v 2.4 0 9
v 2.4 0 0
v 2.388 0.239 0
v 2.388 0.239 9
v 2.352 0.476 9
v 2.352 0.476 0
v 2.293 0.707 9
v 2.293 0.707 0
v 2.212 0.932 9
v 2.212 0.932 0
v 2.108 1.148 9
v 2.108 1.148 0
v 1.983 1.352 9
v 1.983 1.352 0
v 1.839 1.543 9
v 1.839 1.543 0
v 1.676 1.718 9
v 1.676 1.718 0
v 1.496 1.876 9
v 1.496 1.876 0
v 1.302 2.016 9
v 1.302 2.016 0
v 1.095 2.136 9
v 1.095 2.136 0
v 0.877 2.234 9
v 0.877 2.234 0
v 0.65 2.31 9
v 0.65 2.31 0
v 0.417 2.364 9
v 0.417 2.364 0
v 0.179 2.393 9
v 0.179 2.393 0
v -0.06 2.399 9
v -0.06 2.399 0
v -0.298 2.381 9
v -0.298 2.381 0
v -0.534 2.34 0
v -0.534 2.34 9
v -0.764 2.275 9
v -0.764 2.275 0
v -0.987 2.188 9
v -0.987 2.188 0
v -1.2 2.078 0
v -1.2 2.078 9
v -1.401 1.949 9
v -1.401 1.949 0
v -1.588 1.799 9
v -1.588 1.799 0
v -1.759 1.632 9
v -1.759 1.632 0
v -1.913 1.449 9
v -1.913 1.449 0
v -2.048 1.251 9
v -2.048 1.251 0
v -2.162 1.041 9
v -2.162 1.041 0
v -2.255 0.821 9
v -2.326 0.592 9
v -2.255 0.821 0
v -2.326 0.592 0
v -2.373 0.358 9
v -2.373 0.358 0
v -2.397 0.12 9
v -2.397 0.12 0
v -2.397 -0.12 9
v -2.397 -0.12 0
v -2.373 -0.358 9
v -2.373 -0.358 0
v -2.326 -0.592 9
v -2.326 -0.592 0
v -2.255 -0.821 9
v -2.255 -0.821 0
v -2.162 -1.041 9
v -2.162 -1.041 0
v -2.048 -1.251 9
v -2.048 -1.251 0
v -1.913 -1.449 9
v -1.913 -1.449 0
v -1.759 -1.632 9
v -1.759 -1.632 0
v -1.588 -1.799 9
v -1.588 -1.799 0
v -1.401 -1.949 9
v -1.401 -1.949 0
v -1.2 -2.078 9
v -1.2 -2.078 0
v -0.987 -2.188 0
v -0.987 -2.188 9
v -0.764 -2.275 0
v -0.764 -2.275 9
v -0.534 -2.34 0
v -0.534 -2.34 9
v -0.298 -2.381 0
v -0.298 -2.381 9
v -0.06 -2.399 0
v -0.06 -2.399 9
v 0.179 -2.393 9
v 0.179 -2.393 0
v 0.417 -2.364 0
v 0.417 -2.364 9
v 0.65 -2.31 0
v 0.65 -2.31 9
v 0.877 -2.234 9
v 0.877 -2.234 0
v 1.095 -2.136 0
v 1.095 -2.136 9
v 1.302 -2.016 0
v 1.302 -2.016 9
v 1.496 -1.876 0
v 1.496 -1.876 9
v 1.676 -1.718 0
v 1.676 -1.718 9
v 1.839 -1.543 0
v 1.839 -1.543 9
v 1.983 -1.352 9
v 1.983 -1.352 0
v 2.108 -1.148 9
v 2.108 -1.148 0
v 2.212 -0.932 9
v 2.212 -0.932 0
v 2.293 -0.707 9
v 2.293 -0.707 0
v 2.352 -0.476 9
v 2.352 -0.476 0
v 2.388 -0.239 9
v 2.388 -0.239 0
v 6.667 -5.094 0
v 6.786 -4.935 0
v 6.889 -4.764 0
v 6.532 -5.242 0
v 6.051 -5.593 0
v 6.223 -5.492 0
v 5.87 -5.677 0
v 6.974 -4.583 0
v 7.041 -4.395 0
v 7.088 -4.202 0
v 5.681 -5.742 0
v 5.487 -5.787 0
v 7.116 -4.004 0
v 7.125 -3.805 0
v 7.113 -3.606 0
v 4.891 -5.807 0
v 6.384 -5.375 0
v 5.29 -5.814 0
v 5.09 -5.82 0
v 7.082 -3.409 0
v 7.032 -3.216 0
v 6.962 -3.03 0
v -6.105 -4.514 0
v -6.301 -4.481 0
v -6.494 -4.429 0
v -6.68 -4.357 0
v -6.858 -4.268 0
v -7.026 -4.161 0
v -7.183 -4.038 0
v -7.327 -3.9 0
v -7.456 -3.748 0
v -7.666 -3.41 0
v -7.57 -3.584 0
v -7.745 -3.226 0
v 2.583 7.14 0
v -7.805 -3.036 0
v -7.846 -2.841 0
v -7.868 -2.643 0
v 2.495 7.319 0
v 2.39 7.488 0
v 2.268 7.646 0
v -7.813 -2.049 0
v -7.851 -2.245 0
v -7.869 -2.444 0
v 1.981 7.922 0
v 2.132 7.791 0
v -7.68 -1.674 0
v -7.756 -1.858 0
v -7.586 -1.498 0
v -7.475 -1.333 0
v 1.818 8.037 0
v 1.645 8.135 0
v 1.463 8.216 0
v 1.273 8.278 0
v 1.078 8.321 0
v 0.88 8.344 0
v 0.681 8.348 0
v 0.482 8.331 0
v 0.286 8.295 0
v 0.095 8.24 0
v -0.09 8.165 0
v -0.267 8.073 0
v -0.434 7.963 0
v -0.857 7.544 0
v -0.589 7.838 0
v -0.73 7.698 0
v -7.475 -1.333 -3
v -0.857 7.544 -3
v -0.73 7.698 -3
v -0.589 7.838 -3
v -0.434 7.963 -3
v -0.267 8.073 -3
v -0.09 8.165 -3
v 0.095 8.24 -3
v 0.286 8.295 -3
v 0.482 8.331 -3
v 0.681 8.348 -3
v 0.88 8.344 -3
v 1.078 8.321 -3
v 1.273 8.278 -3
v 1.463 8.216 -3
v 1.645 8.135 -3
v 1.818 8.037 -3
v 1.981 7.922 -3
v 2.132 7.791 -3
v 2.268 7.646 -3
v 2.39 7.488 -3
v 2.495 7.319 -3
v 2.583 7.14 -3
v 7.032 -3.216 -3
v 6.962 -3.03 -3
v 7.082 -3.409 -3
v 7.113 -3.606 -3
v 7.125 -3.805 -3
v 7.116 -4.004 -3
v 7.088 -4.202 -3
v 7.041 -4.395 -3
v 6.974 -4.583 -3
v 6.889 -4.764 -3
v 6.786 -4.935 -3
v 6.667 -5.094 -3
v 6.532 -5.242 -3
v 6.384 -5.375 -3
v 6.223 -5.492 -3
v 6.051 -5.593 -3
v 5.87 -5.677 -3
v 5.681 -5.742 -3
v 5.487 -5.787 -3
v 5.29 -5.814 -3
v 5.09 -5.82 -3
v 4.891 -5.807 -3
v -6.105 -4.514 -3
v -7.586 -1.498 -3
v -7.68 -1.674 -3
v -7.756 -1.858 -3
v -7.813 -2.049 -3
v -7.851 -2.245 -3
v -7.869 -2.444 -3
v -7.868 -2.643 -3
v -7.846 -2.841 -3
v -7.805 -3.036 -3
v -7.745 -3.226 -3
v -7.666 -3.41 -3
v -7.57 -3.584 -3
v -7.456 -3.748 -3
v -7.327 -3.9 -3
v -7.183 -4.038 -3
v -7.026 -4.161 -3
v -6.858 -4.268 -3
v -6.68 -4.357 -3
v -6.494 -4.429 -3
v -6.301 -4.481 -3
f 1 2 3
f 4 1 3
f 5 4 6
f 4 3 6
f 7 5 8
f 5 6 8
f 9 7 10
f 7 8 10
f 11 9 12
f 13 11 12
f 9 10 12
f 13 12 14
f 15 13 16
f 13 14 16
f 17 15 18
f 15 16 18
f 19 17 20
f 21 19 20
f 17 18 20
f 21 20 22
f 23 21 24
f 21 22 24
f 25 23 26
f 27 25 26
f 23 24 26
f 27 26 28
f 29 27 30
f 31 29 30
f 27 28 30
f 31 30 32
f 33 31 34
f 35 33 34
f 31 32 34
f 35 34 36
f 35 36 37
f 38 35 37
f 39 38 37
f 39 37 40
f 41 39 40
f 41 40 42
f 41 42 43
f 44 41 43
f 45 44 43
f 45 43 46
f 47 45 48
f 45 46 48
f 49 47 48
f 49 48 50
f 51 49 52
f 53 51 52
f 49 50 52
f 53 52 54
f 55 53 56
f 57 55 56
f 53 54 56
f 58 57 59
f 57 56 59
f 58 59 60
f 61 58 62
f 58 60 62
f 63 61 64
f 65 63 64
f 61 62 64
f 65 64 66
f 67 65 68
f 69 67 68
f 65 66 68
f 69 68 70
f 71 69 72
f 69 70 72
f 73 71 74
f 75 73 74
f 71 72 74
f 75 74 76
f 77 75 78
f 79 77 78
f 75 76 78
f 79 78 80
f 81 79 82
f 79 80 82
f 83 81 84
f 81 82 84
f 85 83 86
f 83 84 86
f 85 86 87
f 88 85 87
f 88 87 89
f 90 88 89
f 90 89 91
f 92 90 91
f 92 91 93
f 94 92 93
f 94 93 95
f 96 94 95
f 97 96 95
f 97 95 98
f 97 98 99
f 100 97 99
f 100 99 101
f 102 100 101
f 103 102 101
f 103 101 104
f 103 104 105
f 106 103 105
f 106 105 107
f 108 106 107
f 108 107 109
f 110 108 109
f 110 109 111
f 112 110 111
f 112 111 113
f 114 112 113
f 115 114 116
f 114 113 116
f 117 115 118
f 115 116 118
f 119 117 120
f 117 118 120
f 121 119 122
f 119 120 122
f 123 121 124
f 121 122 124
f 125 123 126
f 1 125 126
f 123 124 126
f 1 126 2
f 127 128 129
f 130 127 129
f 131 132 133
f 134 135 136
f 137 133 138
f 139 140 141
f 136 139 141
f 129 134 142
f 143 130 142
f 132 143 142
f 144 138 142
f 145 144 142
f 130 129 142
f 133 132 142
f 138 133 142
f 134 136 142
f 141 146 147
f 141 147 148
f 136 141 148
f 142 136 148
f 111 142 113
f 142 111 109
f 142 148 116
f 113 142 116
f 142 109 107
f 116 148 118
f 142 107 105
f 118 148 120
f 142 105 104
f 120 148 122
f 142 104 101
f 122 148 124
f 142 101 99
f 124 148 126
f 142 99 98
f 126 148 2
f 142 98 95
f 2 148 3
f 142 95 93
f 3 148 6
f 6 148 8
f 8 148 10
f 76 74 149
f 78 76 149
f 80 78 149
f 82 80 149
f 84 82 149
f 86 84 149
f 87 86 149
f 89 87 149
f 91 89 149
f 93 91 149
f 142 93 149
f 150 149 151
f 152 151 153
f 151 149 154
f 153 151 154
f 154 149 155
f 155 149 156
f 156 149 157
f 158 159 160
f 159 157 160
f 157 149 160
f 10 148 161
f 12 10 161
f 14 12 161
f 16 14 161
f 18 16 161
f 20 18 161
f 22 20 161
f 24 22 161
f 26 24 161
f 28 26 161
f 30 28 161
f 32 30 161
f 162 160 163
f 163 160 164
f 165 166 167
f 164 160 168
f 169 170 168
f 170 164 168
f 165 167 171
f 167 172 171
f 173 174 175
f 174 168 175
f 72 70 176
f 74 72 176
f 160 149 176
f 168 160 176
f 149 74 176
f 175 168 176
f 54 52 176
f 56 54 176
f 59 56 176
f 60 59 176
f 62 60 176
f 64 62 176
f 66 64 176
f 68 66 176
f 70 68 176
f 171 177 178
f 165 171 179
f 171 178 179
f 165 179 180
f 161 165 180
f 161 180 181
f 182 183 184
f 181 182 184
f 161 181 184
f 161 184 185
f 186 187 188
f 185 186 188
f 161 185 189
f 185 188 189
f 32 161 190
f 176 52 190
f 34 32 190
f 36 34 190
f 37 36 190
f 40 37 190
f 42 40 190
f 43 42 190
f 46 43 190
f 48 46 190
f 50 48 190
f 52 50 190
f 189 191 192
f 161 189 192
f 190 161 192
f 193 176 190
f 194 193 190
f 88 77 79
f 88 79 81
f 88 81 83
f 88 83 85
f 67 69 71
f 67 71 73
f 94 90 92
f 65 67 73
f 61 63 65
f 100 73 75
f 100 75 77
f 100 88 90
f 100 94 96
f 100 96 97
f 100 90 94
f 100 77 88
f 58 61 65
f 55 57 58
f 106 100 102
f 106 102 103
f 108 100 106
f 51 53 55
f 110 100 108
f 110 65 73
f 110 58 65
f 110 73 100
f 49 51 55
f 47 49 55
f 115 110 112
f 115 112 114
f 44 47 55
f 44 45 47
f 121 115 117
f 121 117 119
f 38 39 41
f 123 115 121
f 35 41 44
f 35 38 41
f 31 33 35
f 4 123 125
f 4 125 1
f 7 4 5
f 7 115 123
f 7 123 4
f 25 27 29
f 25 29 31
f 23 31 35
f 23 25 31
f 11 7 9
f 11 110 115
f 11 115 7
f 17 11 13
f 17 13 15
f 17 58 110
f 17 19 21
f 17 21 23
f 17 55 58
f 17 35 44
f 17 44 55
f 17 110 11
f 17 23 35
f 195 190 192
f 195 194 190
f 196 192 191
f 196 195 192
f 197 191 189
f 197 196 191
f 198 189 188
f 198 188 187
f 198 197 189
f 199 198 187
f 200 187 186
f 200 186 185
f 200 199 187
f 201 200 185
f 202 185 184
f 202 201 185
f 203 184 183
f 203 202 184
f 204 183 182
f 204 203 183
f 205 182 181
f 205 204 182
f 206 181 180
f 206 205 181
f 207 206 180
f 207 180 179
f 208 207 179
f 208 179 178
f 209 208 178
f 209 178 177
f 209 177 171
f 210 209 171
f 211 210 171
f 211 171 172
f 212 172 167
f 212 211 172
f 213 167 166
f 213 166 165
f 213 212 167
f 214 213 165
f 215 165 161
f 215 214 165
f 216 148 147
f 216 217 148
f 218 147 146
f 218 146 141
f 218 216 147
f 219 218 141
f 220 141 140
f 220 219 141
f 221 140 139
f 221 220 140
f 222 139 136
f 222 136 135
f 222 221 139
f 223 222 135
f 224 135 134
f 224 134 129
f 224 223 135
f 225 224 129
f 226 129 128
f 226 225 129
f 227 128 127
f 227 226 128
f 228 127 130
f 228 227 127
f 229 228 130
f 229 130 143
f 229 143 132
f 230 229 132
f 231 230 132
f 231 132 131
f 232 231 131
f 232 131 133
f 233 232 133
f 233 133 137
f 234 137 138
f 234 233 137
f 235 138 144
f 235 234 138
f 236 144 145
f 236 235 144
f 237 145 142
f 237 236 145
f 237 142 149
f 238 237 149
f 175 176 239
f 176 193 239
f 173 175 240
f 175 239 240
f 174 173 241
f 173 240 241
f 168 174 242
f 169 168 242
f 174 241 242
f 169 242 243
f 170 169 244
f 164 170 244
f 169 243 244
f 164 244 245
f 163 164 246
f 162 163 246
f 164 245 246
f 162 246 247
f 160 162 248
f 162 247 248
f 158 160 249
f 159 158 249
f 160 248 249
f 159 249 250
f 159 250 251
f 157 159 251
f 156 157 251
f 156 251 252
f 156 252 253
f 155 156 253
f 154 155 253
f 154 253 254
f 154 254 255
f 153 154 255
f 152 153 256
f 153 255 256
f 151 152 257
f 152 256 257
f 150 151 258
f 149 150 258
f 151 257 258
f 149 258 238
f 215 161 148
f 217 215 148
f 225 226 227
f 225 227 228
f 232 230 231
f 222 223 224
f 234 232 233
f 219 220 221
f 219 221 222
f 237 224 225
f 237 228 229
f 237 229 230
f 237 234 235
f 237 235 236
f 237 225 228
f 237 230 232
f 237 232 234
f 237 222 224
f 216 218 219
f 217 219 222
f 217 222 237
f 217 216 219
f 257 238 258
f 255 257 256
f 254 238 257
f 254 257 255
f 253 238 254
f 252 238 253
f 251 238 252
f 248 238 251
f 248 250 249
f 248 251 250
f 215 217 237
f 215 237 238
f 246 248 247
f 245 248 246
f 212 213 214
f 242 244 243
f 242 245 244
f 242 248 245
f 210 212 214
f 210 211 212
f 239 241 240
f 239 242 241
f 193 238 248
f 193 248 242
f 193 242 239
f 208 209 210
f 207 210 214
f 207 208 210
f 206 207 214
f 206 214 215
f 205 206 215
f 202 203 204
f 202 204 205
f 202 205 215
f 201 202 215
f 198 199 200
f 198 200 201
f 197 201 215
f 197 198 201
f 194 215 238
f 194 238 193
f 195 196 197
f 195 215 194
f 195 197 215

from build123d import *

# Parameters (mm, degrees)
SKETCH_1_R      = 2.4
EXTRUDE_1_DEPTH = 9
EXTRUDE_2_DEPTH = 3
FILLET_2_R      = 2
FILLET_3_R      = 2
FILLET_4_R      = 2


with BuildPart() as part:
    # 草图1 → 凸台-拉伸1 (new body)
    with BuildSketch(Plane.XY):
        Circle(SKETCH_1_R)
    extrude(amount=EXTRUDE_1_DEPTH)

    # 草图2 → 凸台-拉伸2 (add)
    with BuildSketch(Plane(origin=(0, 0, 0), x_dir=(-1, 0, 0), z_dir=(0, 0, -1))):
        Polygon((9.54506031, -4.109966384), (-1.213194857, 10.321247901), (-8.331865453, -6.211281517), align=None)
    extrude(amount=EXTRUDE_2_DEPTH)

    # 圆角2
    fillet_2_edges = [part.edges().sort_by_distance(p)[0] for p in [
        (-9.54506031, -4.109966384, -1.5),
    ]]
    fillet(fillet_2_edges, radius=FILLET_2_R)

    # 圆角3
    fillet_3_edges = [part.edges().sort_by_distance(p)[0] for p in [
        (1.213194857, 10.321247901, -1.5),
    ]]
    fillet(fillet_3_edges, radius=FILLET_3_R)

    # 圆角4
    fillet_4_edges = [part.edges().sort_by_distance(p)[0] for p in [
        (8.331865453, -6.211281517, -1.5),
    ]]
    fillet(fillet_4_edges, radius=FILLET_4_R)


solid = part.part
